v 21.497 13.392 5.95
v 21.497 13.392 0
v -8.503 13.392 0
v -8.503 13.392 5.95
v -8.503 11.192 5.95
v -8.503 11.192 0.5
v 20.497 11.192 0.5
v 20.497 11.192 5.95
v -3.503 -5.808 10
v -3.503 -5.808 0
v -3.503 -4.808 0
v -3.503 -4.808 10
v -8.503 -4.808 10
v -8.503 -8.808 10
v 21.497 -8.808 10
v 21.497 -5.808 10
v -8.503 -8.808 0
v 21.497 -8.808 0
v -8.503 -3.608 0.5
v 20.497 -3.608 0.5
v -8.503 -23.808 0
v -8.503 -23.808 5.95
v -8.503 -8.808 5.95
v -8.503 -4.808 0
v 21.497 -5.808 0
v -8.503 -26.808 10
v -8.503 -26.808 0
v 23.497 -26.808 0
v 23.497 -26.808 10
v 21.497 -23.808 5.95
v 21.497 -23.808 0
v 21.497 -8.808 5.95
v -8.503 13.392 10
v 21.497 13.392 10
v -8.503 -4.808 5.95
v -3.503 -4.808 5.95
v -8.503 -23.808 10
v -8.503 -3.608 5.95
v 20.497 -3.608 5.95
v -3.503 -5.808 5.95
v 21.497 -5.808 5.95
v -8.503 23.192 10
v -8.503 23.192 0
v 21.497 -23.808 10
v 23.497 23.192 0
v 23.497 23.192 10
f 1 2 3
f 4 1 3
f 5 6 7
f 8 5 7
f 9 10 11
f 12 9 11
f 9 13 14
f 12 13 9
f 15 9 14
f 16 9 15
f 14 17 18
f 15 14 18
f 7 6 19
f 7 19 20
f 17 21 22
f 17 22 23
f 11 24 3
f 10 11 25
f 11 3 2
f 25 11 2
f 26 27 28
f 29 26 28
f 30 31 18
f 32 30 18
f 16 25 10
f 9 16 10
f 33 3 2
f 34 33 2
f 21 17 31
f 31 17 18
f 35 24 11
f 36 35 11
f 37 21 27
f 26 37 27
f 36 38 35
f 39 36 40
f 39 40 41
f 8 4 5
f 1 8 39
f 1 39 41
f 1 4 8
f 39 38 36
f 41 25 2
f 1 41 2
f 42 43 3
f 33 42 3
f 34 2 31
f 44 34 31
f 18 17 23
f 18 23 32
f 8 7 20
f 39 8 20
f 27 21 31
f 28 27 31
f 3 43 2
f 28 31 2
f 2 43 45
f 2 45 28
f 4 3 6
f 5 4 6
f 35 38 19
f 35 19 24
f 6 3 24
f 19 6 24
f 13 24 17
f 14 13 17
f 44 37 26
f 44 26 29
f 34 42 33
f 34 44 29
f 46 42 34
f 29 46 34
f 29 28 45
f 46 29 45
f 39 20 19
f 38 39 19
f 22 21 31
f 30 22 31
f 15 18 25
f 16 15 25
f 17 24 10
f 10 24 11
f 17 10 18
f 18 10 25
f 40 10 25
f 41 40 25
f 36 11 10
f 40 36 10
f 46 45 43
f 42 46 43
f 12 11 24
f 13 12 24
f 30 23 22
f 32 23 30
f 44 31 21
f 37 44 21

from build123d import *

# Parameters (mm, degrees)
F0_W     = 29
F0_H     = 14.8
F1_DEPTH = 0.5
F2_DEPTH = 5.95
F0_W_2   = 30
F0_H_2   = 15
F3_DEPTH = 5.95
F4_DEPTH = 10
F5_DEPTH = 10


with BuildPart() as f1:
    # F0 (on Top) → F1 (new body)
    with BuildSketch(Plane.XY):
        with Locations((5.996847, 3.792403)):
            Rectangle(F0_W, F0_H)
    extrude(amount=F1_DEPTH)

    # F0 (on Top) → F2 (join)
    with BuildSketch(Plane.XY):
        Polygon((-3.503153, 13.392403), (-8.503153, 13.392403), (-8.503153, 11.192403), (20.496847, 11.192403), (20.496847, -3.607597), (-8.503153, -3.607597), (-8.503153, -4.807597), (-3.503153, -4.807597), (-3.503153, -5.807597), (21.496847, -5.807597), (21.496847, 13.392403), align=None)
    extrude(amount=F2_DEPTH)


with BuildPart() as f3:
    # F0 (on Top) → F3 (new body)
    with BuildSketch(Plane.XY):
        with Locations((6.496847, -16.307597)):
            Rectangle(F0_W_2, F0_H_2)
    extrude(amount=F3_DEPTH)


with BuildPart() as f4:
    # F0 (on Top) → F4 (new body)
    with BuildSketch(Plane.XY):
        Polygon((23.496847, 23.192403), (-8.503153, 23.192403), (-8.503153, 13.392403), (-3.503153, 13.392403), (21.496847, 13.392403), (21.496847, -5.807597), (21.496847, -8.807597), (21.496847, -23.807597), (-8.503153, -23.807597), (-8.503153, -26.807597), (23.496847, -26.807597), align=None)
    extrude(amount=F4_DEPTH)


with BuildPart() as f5:
    # F0 (on Top) → F5 (new body)
    with BuildSketch(Plane.XY):
        Polygon((-3.503153, -4.807597), (-8.503153, -4.807597), (-8.503153, -8.807597), (21.496847, -8.807597), (21.496847, -5.807597), (-3.503153, -5.807597), align=None)
    extrude(amount=F5_DEPTH)


solid = Compound([f1.part, f3.part, f4.part, f5.part])
